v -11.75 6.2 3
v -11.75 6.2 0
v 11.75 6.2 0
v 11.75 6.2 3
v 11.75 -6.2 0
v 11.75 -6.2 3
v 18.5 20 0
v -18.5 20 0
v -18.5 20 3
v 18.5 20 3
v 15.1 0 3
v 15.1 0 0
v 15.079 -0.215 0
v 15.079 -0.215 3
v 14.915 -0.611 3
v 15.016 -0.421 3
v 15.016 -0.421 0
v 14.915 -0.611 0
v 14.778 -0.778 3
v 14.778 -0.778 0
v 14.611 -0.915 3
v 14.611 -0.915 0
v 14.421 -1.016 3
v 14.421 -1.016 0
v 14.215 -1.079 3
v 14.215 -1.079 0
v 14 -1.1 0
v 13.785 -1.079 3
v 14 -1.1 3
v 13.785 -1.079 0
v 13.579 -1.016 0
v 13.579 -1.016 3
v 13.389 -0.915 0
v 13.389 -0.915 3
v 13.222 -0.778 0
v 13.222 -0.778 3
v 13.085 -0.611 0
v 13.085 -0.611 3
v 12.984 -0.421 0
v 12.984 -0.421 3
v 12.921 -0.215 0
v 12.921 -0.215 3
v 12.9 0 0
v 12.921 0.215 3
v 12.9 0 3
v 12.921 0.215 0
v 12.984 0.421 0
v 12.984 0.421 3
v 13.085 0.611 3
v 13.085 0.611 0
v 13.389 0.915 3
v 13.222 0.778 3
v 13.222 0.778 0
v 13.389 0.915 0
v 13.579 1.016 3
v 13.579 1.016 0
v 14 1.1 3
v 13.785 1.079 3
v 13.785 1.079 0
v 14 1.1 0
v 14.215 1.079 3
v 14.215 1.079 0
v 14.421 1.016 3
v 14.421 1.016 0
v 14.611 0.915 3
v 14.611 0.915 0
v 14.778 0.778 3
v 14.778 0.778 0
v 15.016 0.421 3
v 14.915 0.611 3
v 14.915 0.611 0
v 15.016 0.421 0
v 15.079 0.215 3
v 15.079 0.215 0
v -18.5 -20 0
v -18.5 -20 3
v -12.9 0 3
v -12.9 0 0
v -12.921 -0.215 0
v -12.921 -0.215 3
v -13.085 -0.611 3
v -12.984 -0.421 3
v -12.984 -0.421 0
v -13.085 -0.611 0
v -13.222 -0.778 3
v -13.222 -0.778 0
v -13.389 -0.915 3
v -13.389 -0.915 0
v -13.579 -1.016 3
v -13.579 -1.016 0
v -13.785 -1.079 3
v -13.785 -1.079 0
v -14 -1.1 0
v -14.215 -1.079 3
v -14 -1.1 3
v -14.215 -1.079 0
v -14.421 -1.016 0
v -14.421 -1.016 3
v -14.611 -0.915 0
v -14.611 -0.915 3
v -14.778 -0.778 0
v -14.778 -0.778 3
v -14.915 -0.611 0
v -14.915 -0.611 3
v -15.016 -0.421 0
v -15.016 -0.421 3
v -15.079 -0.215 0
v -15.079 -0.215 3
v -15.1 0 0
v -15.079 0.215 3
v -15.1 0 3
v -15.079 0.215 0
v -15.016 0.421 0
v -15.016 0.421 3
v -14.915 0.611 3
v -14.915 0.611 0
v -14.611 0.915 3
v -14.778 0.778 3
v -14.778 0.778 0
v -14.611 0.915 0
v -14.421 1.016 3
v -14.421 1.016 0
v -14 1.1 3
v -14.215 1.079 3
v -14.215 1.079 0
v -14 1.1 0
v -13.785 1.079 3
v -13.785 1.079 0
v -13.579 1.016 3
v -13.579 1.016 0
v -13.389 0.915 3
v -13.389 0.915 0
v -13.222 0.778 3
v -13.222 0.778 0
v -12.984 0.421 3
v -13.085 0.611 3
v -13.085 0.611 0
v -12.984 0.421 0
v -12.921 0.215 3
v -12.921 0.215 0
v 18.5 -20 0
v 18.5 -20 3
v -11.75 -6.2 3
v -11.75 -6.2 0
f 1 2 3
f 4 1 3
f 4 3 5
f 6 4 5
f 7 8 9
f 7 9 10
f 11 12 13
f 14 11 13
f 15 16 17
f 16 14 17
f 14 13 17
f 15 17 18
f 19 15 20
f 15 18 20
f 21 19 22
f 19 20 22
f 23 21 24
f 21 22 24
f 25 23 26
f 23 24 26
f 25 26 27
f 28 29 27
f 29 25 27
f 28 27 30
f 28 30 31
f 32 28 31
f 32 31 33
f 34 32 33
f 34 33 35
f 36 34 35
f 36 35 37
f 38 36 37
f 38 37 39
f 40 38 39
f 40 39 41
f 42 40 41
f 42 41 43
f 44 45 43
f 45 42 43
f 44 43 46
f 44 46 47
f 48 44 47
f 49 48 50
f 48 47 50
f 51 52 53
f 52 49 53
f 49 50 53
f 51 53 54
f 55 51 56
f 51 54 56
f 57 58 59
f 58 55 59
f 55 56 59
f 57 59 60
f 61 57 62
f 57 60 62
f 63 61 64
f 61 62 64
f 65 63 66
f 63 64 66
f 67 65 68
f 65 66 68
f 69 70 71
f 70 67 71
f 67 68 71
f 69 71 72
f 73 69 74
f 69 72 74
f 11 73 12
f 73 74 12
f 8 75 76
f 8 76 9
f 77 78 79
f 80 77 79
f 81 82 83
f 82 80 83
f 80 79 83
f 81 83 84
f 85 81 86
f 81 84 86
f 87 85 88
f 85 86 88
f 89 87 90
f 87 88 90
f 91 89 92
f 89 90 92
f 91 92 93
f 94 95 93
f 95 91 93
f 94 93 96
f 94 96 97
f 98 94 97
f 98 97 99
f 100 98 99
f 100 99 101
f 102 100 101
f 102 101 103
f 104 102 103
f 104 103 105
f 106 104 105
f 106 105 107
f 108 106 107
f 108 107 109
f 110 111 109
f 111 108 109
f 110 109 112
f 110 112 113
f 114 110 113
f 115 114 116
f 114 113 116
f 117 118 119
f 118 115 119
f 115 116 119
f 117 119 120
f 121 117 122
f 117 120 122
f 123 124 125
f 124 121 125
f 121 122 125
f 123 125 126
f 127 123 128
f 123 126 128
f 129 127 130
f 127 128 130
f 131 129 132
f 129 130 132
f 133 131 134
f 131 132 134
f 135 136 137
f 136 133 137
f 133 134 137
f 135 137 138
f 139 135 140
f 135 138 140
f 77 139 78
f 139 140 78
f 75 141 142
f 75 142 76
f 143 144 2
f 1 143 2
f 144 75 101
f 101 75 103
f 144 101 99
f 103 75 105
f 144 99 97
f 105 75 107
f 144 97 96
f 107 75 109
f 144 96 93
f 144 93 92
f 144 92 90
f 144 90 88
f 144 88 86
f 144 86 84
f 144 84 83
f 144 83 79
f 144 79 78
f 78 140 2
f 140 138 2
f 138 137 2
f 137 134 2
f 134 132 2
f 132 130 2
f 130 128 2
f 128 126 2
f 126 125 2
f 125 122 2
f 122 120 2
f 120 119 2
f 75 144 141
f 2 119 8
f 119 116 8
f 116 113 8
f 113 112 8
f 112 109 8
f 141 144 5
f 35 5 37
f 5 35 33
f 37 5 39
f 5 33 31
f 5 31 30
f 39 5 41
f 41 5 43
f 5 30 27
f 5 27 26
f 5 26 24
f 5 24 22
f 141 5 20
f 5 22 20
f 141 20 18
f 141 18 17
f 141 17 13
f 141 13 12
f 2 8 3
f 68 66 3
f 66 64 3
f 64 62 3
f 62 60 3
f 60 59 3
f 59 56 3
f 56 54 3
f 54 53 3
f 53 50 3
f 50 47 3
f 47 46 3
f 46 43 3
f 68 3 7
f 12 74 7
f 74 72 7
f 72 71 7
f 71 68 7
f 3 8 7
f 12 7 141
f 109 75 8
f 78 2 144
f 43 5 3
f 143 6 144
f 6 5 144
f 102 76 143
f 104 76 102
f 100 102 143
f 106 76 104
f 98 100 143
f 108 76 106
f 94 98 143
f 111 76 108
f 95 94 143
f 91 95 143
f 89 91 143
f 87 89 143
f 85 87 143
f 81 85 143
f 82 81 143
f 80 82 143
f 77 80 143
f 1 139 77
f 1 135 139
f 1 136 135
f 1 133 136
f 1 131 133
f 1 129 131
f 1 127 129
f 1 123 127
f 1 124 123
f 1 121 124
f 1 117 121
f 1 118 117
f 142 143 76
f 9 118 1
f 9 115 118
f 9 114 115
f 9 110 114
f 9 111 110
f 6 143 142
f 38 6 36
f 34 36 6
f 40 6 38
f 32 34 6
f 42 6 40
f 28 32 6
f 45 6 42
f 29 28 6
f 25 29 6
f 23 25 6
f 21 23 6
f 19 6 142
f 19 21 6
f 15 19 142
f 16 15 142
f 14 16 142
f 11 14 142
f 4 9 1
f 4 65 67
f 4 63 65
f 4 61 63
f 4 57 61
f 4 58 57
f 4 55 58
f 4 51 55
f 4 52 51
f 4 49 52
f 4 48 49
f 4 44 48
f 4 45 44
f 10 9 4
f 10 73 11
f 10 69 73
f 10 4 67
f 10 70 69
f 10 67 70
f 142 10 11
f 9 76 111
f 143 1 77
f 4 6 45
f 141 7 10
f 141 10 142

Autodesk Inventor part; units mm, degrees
ref_plane "YZ Plane" through (0, 0, 0) normal (1, 0, 0) x (0, 1, 0)
ref_plane "XZ Plane" through (0, 0, 0) normal (0, 1, 0) x (-1, 0, 0)
ref_plane "XY Plane" through (0, 0, 0) normal (0, 0, 1) x (1, 0, 0)
sketch "Block1_1" plane through (0, 0, 0) normal (0, 0, 1) x (1, 0, 0)
  circle A0 centre (47.029, 24.2723) radius 1.1
  circle A1 centre (75.029, 24.2723) radius 1.1
  line L0 (49.279, 30.4723) -> (72.779, 30.4723)
  line L1 (72.779, 30.4723) -> (72.779, 18.0723)
  line L2 (72.779, 18.0723) -> (49.279, 18.0723)
  line L3 (49.279, 18.0723) -> (49.279, 30.4723)
  line L4 (49.279, 30.4723) -> (44.779, 30.4723)
  line L5 (44.779, 30.4723) -> (44.779, 18.0723)
  line L6 (44.779, 18.0723) -> (49.279, 18.0723)
  line L7 (49.279, 18.0723) -> (49.279, 30.4723)
  line L8 (72.779, 30.4723) -> (77.279, 30.4723)
  line L9 (77.279, 30.4723) -> (77.279, 18.0723)
  line L10 (77.279, 18.0723) -> (72.779, 18.0723)
  line L11 (72.779, 18.0723) -> (72.779, 30.4723)
  line L12 (44.779, 24.2723) -> (77.279, 24.2723) construction
  line L13 (61.029, 30.4723) -> (61.029, 18.0723) construction
  line L14 (47.029, 30.4723) -> (47.029, 18.0723) construction
  line L15 (75.029, 30.4723) -> (75.029, 18.0723) construction
  line L16 (66.779, 30.4723) -> (66.779, 18.0723) construction
  point P0 (60.979, 24.0984)
  dimension "d2" = 23.5
  dimension "d3" = 12.4
  dimension "d4" = 4.5
  dimension "d5" = 4.5
  dimension "d6" = 2.2
  dimension "d7" = 2.2
  dimension "d8" = 2.25
  dimension "d9" = 6
sketch "Sketch1" plane through (0, 0, 0) normal (0, 0, 1) x (1, 0, 0)
  line L0 (-18.5, 20) -> (18.5, 20)
  line L1 (18.5, 20) -> (18.5, -20)
  line L2 (18.5, -20) -> (-18.5, -20)
  line L3 (-18.5, -20) -> (-18.5, 20)
  circle A0 centre (-14, 0) radius 1.1
  circle A1 centre (14, 0) radius 1.1
  line L4 (-11.75, 6.2) -> (11.75, 6.2)
  line L5 (11.75, 6.2) -> (11.75, -6.2)
  line L6 (11.75, -6.2) -> (-11.75, -6.2)
  line L7 (-11.75, -6.2) -> (-11.75, 6.2)
  line L8 (-11.75, 6.2) -> (-16.25, 6.2)
  line L9 (-16.25, 6.2) -> (-16.25, -6.2)
  line L10 (-16.25, -6.2) -> (-11.75, -6.2)
  line L11 (-11.75, -6.2) -> (-11.75, 6.2)
  line L12 (11.75, 6.2) -> (16.25, 6.2)
  line L13 (16.25, 6.2) -> (16.25, -6.2)
  line L14 (16.25, -6.2) -> (11.75, -6.2)
  line L15 (11.75, -6.2) -> (11.75, 6.2)
  line L16 (-16.25, 0) -> (16.25, 0) construction
  line L17 (0, 6.2) -> (0, -6.2) construction
  line L18 (-14, 6.2) -> (-14, -6.2) construction
  line L19 (14, 6.2) -> (14, -6.2) construction
  line L20 (5.75, 6.2) -> (5.75, -6.2) construction
  point P0 (0, 0)
  point P1 (18.5, 0)
  point P2 (0, 20)
  point P3 (0, 0)
  dimension "d0" = 37
  dimension "d1" = 40
extrude "Extrusion1" add sketch "Sketch1" along normal blind 3 contours L0 L1 L2 L3 | L7 L10 L9 L8 | L12 L13 L14 L5
properties part number "ServoHolderPlate"
